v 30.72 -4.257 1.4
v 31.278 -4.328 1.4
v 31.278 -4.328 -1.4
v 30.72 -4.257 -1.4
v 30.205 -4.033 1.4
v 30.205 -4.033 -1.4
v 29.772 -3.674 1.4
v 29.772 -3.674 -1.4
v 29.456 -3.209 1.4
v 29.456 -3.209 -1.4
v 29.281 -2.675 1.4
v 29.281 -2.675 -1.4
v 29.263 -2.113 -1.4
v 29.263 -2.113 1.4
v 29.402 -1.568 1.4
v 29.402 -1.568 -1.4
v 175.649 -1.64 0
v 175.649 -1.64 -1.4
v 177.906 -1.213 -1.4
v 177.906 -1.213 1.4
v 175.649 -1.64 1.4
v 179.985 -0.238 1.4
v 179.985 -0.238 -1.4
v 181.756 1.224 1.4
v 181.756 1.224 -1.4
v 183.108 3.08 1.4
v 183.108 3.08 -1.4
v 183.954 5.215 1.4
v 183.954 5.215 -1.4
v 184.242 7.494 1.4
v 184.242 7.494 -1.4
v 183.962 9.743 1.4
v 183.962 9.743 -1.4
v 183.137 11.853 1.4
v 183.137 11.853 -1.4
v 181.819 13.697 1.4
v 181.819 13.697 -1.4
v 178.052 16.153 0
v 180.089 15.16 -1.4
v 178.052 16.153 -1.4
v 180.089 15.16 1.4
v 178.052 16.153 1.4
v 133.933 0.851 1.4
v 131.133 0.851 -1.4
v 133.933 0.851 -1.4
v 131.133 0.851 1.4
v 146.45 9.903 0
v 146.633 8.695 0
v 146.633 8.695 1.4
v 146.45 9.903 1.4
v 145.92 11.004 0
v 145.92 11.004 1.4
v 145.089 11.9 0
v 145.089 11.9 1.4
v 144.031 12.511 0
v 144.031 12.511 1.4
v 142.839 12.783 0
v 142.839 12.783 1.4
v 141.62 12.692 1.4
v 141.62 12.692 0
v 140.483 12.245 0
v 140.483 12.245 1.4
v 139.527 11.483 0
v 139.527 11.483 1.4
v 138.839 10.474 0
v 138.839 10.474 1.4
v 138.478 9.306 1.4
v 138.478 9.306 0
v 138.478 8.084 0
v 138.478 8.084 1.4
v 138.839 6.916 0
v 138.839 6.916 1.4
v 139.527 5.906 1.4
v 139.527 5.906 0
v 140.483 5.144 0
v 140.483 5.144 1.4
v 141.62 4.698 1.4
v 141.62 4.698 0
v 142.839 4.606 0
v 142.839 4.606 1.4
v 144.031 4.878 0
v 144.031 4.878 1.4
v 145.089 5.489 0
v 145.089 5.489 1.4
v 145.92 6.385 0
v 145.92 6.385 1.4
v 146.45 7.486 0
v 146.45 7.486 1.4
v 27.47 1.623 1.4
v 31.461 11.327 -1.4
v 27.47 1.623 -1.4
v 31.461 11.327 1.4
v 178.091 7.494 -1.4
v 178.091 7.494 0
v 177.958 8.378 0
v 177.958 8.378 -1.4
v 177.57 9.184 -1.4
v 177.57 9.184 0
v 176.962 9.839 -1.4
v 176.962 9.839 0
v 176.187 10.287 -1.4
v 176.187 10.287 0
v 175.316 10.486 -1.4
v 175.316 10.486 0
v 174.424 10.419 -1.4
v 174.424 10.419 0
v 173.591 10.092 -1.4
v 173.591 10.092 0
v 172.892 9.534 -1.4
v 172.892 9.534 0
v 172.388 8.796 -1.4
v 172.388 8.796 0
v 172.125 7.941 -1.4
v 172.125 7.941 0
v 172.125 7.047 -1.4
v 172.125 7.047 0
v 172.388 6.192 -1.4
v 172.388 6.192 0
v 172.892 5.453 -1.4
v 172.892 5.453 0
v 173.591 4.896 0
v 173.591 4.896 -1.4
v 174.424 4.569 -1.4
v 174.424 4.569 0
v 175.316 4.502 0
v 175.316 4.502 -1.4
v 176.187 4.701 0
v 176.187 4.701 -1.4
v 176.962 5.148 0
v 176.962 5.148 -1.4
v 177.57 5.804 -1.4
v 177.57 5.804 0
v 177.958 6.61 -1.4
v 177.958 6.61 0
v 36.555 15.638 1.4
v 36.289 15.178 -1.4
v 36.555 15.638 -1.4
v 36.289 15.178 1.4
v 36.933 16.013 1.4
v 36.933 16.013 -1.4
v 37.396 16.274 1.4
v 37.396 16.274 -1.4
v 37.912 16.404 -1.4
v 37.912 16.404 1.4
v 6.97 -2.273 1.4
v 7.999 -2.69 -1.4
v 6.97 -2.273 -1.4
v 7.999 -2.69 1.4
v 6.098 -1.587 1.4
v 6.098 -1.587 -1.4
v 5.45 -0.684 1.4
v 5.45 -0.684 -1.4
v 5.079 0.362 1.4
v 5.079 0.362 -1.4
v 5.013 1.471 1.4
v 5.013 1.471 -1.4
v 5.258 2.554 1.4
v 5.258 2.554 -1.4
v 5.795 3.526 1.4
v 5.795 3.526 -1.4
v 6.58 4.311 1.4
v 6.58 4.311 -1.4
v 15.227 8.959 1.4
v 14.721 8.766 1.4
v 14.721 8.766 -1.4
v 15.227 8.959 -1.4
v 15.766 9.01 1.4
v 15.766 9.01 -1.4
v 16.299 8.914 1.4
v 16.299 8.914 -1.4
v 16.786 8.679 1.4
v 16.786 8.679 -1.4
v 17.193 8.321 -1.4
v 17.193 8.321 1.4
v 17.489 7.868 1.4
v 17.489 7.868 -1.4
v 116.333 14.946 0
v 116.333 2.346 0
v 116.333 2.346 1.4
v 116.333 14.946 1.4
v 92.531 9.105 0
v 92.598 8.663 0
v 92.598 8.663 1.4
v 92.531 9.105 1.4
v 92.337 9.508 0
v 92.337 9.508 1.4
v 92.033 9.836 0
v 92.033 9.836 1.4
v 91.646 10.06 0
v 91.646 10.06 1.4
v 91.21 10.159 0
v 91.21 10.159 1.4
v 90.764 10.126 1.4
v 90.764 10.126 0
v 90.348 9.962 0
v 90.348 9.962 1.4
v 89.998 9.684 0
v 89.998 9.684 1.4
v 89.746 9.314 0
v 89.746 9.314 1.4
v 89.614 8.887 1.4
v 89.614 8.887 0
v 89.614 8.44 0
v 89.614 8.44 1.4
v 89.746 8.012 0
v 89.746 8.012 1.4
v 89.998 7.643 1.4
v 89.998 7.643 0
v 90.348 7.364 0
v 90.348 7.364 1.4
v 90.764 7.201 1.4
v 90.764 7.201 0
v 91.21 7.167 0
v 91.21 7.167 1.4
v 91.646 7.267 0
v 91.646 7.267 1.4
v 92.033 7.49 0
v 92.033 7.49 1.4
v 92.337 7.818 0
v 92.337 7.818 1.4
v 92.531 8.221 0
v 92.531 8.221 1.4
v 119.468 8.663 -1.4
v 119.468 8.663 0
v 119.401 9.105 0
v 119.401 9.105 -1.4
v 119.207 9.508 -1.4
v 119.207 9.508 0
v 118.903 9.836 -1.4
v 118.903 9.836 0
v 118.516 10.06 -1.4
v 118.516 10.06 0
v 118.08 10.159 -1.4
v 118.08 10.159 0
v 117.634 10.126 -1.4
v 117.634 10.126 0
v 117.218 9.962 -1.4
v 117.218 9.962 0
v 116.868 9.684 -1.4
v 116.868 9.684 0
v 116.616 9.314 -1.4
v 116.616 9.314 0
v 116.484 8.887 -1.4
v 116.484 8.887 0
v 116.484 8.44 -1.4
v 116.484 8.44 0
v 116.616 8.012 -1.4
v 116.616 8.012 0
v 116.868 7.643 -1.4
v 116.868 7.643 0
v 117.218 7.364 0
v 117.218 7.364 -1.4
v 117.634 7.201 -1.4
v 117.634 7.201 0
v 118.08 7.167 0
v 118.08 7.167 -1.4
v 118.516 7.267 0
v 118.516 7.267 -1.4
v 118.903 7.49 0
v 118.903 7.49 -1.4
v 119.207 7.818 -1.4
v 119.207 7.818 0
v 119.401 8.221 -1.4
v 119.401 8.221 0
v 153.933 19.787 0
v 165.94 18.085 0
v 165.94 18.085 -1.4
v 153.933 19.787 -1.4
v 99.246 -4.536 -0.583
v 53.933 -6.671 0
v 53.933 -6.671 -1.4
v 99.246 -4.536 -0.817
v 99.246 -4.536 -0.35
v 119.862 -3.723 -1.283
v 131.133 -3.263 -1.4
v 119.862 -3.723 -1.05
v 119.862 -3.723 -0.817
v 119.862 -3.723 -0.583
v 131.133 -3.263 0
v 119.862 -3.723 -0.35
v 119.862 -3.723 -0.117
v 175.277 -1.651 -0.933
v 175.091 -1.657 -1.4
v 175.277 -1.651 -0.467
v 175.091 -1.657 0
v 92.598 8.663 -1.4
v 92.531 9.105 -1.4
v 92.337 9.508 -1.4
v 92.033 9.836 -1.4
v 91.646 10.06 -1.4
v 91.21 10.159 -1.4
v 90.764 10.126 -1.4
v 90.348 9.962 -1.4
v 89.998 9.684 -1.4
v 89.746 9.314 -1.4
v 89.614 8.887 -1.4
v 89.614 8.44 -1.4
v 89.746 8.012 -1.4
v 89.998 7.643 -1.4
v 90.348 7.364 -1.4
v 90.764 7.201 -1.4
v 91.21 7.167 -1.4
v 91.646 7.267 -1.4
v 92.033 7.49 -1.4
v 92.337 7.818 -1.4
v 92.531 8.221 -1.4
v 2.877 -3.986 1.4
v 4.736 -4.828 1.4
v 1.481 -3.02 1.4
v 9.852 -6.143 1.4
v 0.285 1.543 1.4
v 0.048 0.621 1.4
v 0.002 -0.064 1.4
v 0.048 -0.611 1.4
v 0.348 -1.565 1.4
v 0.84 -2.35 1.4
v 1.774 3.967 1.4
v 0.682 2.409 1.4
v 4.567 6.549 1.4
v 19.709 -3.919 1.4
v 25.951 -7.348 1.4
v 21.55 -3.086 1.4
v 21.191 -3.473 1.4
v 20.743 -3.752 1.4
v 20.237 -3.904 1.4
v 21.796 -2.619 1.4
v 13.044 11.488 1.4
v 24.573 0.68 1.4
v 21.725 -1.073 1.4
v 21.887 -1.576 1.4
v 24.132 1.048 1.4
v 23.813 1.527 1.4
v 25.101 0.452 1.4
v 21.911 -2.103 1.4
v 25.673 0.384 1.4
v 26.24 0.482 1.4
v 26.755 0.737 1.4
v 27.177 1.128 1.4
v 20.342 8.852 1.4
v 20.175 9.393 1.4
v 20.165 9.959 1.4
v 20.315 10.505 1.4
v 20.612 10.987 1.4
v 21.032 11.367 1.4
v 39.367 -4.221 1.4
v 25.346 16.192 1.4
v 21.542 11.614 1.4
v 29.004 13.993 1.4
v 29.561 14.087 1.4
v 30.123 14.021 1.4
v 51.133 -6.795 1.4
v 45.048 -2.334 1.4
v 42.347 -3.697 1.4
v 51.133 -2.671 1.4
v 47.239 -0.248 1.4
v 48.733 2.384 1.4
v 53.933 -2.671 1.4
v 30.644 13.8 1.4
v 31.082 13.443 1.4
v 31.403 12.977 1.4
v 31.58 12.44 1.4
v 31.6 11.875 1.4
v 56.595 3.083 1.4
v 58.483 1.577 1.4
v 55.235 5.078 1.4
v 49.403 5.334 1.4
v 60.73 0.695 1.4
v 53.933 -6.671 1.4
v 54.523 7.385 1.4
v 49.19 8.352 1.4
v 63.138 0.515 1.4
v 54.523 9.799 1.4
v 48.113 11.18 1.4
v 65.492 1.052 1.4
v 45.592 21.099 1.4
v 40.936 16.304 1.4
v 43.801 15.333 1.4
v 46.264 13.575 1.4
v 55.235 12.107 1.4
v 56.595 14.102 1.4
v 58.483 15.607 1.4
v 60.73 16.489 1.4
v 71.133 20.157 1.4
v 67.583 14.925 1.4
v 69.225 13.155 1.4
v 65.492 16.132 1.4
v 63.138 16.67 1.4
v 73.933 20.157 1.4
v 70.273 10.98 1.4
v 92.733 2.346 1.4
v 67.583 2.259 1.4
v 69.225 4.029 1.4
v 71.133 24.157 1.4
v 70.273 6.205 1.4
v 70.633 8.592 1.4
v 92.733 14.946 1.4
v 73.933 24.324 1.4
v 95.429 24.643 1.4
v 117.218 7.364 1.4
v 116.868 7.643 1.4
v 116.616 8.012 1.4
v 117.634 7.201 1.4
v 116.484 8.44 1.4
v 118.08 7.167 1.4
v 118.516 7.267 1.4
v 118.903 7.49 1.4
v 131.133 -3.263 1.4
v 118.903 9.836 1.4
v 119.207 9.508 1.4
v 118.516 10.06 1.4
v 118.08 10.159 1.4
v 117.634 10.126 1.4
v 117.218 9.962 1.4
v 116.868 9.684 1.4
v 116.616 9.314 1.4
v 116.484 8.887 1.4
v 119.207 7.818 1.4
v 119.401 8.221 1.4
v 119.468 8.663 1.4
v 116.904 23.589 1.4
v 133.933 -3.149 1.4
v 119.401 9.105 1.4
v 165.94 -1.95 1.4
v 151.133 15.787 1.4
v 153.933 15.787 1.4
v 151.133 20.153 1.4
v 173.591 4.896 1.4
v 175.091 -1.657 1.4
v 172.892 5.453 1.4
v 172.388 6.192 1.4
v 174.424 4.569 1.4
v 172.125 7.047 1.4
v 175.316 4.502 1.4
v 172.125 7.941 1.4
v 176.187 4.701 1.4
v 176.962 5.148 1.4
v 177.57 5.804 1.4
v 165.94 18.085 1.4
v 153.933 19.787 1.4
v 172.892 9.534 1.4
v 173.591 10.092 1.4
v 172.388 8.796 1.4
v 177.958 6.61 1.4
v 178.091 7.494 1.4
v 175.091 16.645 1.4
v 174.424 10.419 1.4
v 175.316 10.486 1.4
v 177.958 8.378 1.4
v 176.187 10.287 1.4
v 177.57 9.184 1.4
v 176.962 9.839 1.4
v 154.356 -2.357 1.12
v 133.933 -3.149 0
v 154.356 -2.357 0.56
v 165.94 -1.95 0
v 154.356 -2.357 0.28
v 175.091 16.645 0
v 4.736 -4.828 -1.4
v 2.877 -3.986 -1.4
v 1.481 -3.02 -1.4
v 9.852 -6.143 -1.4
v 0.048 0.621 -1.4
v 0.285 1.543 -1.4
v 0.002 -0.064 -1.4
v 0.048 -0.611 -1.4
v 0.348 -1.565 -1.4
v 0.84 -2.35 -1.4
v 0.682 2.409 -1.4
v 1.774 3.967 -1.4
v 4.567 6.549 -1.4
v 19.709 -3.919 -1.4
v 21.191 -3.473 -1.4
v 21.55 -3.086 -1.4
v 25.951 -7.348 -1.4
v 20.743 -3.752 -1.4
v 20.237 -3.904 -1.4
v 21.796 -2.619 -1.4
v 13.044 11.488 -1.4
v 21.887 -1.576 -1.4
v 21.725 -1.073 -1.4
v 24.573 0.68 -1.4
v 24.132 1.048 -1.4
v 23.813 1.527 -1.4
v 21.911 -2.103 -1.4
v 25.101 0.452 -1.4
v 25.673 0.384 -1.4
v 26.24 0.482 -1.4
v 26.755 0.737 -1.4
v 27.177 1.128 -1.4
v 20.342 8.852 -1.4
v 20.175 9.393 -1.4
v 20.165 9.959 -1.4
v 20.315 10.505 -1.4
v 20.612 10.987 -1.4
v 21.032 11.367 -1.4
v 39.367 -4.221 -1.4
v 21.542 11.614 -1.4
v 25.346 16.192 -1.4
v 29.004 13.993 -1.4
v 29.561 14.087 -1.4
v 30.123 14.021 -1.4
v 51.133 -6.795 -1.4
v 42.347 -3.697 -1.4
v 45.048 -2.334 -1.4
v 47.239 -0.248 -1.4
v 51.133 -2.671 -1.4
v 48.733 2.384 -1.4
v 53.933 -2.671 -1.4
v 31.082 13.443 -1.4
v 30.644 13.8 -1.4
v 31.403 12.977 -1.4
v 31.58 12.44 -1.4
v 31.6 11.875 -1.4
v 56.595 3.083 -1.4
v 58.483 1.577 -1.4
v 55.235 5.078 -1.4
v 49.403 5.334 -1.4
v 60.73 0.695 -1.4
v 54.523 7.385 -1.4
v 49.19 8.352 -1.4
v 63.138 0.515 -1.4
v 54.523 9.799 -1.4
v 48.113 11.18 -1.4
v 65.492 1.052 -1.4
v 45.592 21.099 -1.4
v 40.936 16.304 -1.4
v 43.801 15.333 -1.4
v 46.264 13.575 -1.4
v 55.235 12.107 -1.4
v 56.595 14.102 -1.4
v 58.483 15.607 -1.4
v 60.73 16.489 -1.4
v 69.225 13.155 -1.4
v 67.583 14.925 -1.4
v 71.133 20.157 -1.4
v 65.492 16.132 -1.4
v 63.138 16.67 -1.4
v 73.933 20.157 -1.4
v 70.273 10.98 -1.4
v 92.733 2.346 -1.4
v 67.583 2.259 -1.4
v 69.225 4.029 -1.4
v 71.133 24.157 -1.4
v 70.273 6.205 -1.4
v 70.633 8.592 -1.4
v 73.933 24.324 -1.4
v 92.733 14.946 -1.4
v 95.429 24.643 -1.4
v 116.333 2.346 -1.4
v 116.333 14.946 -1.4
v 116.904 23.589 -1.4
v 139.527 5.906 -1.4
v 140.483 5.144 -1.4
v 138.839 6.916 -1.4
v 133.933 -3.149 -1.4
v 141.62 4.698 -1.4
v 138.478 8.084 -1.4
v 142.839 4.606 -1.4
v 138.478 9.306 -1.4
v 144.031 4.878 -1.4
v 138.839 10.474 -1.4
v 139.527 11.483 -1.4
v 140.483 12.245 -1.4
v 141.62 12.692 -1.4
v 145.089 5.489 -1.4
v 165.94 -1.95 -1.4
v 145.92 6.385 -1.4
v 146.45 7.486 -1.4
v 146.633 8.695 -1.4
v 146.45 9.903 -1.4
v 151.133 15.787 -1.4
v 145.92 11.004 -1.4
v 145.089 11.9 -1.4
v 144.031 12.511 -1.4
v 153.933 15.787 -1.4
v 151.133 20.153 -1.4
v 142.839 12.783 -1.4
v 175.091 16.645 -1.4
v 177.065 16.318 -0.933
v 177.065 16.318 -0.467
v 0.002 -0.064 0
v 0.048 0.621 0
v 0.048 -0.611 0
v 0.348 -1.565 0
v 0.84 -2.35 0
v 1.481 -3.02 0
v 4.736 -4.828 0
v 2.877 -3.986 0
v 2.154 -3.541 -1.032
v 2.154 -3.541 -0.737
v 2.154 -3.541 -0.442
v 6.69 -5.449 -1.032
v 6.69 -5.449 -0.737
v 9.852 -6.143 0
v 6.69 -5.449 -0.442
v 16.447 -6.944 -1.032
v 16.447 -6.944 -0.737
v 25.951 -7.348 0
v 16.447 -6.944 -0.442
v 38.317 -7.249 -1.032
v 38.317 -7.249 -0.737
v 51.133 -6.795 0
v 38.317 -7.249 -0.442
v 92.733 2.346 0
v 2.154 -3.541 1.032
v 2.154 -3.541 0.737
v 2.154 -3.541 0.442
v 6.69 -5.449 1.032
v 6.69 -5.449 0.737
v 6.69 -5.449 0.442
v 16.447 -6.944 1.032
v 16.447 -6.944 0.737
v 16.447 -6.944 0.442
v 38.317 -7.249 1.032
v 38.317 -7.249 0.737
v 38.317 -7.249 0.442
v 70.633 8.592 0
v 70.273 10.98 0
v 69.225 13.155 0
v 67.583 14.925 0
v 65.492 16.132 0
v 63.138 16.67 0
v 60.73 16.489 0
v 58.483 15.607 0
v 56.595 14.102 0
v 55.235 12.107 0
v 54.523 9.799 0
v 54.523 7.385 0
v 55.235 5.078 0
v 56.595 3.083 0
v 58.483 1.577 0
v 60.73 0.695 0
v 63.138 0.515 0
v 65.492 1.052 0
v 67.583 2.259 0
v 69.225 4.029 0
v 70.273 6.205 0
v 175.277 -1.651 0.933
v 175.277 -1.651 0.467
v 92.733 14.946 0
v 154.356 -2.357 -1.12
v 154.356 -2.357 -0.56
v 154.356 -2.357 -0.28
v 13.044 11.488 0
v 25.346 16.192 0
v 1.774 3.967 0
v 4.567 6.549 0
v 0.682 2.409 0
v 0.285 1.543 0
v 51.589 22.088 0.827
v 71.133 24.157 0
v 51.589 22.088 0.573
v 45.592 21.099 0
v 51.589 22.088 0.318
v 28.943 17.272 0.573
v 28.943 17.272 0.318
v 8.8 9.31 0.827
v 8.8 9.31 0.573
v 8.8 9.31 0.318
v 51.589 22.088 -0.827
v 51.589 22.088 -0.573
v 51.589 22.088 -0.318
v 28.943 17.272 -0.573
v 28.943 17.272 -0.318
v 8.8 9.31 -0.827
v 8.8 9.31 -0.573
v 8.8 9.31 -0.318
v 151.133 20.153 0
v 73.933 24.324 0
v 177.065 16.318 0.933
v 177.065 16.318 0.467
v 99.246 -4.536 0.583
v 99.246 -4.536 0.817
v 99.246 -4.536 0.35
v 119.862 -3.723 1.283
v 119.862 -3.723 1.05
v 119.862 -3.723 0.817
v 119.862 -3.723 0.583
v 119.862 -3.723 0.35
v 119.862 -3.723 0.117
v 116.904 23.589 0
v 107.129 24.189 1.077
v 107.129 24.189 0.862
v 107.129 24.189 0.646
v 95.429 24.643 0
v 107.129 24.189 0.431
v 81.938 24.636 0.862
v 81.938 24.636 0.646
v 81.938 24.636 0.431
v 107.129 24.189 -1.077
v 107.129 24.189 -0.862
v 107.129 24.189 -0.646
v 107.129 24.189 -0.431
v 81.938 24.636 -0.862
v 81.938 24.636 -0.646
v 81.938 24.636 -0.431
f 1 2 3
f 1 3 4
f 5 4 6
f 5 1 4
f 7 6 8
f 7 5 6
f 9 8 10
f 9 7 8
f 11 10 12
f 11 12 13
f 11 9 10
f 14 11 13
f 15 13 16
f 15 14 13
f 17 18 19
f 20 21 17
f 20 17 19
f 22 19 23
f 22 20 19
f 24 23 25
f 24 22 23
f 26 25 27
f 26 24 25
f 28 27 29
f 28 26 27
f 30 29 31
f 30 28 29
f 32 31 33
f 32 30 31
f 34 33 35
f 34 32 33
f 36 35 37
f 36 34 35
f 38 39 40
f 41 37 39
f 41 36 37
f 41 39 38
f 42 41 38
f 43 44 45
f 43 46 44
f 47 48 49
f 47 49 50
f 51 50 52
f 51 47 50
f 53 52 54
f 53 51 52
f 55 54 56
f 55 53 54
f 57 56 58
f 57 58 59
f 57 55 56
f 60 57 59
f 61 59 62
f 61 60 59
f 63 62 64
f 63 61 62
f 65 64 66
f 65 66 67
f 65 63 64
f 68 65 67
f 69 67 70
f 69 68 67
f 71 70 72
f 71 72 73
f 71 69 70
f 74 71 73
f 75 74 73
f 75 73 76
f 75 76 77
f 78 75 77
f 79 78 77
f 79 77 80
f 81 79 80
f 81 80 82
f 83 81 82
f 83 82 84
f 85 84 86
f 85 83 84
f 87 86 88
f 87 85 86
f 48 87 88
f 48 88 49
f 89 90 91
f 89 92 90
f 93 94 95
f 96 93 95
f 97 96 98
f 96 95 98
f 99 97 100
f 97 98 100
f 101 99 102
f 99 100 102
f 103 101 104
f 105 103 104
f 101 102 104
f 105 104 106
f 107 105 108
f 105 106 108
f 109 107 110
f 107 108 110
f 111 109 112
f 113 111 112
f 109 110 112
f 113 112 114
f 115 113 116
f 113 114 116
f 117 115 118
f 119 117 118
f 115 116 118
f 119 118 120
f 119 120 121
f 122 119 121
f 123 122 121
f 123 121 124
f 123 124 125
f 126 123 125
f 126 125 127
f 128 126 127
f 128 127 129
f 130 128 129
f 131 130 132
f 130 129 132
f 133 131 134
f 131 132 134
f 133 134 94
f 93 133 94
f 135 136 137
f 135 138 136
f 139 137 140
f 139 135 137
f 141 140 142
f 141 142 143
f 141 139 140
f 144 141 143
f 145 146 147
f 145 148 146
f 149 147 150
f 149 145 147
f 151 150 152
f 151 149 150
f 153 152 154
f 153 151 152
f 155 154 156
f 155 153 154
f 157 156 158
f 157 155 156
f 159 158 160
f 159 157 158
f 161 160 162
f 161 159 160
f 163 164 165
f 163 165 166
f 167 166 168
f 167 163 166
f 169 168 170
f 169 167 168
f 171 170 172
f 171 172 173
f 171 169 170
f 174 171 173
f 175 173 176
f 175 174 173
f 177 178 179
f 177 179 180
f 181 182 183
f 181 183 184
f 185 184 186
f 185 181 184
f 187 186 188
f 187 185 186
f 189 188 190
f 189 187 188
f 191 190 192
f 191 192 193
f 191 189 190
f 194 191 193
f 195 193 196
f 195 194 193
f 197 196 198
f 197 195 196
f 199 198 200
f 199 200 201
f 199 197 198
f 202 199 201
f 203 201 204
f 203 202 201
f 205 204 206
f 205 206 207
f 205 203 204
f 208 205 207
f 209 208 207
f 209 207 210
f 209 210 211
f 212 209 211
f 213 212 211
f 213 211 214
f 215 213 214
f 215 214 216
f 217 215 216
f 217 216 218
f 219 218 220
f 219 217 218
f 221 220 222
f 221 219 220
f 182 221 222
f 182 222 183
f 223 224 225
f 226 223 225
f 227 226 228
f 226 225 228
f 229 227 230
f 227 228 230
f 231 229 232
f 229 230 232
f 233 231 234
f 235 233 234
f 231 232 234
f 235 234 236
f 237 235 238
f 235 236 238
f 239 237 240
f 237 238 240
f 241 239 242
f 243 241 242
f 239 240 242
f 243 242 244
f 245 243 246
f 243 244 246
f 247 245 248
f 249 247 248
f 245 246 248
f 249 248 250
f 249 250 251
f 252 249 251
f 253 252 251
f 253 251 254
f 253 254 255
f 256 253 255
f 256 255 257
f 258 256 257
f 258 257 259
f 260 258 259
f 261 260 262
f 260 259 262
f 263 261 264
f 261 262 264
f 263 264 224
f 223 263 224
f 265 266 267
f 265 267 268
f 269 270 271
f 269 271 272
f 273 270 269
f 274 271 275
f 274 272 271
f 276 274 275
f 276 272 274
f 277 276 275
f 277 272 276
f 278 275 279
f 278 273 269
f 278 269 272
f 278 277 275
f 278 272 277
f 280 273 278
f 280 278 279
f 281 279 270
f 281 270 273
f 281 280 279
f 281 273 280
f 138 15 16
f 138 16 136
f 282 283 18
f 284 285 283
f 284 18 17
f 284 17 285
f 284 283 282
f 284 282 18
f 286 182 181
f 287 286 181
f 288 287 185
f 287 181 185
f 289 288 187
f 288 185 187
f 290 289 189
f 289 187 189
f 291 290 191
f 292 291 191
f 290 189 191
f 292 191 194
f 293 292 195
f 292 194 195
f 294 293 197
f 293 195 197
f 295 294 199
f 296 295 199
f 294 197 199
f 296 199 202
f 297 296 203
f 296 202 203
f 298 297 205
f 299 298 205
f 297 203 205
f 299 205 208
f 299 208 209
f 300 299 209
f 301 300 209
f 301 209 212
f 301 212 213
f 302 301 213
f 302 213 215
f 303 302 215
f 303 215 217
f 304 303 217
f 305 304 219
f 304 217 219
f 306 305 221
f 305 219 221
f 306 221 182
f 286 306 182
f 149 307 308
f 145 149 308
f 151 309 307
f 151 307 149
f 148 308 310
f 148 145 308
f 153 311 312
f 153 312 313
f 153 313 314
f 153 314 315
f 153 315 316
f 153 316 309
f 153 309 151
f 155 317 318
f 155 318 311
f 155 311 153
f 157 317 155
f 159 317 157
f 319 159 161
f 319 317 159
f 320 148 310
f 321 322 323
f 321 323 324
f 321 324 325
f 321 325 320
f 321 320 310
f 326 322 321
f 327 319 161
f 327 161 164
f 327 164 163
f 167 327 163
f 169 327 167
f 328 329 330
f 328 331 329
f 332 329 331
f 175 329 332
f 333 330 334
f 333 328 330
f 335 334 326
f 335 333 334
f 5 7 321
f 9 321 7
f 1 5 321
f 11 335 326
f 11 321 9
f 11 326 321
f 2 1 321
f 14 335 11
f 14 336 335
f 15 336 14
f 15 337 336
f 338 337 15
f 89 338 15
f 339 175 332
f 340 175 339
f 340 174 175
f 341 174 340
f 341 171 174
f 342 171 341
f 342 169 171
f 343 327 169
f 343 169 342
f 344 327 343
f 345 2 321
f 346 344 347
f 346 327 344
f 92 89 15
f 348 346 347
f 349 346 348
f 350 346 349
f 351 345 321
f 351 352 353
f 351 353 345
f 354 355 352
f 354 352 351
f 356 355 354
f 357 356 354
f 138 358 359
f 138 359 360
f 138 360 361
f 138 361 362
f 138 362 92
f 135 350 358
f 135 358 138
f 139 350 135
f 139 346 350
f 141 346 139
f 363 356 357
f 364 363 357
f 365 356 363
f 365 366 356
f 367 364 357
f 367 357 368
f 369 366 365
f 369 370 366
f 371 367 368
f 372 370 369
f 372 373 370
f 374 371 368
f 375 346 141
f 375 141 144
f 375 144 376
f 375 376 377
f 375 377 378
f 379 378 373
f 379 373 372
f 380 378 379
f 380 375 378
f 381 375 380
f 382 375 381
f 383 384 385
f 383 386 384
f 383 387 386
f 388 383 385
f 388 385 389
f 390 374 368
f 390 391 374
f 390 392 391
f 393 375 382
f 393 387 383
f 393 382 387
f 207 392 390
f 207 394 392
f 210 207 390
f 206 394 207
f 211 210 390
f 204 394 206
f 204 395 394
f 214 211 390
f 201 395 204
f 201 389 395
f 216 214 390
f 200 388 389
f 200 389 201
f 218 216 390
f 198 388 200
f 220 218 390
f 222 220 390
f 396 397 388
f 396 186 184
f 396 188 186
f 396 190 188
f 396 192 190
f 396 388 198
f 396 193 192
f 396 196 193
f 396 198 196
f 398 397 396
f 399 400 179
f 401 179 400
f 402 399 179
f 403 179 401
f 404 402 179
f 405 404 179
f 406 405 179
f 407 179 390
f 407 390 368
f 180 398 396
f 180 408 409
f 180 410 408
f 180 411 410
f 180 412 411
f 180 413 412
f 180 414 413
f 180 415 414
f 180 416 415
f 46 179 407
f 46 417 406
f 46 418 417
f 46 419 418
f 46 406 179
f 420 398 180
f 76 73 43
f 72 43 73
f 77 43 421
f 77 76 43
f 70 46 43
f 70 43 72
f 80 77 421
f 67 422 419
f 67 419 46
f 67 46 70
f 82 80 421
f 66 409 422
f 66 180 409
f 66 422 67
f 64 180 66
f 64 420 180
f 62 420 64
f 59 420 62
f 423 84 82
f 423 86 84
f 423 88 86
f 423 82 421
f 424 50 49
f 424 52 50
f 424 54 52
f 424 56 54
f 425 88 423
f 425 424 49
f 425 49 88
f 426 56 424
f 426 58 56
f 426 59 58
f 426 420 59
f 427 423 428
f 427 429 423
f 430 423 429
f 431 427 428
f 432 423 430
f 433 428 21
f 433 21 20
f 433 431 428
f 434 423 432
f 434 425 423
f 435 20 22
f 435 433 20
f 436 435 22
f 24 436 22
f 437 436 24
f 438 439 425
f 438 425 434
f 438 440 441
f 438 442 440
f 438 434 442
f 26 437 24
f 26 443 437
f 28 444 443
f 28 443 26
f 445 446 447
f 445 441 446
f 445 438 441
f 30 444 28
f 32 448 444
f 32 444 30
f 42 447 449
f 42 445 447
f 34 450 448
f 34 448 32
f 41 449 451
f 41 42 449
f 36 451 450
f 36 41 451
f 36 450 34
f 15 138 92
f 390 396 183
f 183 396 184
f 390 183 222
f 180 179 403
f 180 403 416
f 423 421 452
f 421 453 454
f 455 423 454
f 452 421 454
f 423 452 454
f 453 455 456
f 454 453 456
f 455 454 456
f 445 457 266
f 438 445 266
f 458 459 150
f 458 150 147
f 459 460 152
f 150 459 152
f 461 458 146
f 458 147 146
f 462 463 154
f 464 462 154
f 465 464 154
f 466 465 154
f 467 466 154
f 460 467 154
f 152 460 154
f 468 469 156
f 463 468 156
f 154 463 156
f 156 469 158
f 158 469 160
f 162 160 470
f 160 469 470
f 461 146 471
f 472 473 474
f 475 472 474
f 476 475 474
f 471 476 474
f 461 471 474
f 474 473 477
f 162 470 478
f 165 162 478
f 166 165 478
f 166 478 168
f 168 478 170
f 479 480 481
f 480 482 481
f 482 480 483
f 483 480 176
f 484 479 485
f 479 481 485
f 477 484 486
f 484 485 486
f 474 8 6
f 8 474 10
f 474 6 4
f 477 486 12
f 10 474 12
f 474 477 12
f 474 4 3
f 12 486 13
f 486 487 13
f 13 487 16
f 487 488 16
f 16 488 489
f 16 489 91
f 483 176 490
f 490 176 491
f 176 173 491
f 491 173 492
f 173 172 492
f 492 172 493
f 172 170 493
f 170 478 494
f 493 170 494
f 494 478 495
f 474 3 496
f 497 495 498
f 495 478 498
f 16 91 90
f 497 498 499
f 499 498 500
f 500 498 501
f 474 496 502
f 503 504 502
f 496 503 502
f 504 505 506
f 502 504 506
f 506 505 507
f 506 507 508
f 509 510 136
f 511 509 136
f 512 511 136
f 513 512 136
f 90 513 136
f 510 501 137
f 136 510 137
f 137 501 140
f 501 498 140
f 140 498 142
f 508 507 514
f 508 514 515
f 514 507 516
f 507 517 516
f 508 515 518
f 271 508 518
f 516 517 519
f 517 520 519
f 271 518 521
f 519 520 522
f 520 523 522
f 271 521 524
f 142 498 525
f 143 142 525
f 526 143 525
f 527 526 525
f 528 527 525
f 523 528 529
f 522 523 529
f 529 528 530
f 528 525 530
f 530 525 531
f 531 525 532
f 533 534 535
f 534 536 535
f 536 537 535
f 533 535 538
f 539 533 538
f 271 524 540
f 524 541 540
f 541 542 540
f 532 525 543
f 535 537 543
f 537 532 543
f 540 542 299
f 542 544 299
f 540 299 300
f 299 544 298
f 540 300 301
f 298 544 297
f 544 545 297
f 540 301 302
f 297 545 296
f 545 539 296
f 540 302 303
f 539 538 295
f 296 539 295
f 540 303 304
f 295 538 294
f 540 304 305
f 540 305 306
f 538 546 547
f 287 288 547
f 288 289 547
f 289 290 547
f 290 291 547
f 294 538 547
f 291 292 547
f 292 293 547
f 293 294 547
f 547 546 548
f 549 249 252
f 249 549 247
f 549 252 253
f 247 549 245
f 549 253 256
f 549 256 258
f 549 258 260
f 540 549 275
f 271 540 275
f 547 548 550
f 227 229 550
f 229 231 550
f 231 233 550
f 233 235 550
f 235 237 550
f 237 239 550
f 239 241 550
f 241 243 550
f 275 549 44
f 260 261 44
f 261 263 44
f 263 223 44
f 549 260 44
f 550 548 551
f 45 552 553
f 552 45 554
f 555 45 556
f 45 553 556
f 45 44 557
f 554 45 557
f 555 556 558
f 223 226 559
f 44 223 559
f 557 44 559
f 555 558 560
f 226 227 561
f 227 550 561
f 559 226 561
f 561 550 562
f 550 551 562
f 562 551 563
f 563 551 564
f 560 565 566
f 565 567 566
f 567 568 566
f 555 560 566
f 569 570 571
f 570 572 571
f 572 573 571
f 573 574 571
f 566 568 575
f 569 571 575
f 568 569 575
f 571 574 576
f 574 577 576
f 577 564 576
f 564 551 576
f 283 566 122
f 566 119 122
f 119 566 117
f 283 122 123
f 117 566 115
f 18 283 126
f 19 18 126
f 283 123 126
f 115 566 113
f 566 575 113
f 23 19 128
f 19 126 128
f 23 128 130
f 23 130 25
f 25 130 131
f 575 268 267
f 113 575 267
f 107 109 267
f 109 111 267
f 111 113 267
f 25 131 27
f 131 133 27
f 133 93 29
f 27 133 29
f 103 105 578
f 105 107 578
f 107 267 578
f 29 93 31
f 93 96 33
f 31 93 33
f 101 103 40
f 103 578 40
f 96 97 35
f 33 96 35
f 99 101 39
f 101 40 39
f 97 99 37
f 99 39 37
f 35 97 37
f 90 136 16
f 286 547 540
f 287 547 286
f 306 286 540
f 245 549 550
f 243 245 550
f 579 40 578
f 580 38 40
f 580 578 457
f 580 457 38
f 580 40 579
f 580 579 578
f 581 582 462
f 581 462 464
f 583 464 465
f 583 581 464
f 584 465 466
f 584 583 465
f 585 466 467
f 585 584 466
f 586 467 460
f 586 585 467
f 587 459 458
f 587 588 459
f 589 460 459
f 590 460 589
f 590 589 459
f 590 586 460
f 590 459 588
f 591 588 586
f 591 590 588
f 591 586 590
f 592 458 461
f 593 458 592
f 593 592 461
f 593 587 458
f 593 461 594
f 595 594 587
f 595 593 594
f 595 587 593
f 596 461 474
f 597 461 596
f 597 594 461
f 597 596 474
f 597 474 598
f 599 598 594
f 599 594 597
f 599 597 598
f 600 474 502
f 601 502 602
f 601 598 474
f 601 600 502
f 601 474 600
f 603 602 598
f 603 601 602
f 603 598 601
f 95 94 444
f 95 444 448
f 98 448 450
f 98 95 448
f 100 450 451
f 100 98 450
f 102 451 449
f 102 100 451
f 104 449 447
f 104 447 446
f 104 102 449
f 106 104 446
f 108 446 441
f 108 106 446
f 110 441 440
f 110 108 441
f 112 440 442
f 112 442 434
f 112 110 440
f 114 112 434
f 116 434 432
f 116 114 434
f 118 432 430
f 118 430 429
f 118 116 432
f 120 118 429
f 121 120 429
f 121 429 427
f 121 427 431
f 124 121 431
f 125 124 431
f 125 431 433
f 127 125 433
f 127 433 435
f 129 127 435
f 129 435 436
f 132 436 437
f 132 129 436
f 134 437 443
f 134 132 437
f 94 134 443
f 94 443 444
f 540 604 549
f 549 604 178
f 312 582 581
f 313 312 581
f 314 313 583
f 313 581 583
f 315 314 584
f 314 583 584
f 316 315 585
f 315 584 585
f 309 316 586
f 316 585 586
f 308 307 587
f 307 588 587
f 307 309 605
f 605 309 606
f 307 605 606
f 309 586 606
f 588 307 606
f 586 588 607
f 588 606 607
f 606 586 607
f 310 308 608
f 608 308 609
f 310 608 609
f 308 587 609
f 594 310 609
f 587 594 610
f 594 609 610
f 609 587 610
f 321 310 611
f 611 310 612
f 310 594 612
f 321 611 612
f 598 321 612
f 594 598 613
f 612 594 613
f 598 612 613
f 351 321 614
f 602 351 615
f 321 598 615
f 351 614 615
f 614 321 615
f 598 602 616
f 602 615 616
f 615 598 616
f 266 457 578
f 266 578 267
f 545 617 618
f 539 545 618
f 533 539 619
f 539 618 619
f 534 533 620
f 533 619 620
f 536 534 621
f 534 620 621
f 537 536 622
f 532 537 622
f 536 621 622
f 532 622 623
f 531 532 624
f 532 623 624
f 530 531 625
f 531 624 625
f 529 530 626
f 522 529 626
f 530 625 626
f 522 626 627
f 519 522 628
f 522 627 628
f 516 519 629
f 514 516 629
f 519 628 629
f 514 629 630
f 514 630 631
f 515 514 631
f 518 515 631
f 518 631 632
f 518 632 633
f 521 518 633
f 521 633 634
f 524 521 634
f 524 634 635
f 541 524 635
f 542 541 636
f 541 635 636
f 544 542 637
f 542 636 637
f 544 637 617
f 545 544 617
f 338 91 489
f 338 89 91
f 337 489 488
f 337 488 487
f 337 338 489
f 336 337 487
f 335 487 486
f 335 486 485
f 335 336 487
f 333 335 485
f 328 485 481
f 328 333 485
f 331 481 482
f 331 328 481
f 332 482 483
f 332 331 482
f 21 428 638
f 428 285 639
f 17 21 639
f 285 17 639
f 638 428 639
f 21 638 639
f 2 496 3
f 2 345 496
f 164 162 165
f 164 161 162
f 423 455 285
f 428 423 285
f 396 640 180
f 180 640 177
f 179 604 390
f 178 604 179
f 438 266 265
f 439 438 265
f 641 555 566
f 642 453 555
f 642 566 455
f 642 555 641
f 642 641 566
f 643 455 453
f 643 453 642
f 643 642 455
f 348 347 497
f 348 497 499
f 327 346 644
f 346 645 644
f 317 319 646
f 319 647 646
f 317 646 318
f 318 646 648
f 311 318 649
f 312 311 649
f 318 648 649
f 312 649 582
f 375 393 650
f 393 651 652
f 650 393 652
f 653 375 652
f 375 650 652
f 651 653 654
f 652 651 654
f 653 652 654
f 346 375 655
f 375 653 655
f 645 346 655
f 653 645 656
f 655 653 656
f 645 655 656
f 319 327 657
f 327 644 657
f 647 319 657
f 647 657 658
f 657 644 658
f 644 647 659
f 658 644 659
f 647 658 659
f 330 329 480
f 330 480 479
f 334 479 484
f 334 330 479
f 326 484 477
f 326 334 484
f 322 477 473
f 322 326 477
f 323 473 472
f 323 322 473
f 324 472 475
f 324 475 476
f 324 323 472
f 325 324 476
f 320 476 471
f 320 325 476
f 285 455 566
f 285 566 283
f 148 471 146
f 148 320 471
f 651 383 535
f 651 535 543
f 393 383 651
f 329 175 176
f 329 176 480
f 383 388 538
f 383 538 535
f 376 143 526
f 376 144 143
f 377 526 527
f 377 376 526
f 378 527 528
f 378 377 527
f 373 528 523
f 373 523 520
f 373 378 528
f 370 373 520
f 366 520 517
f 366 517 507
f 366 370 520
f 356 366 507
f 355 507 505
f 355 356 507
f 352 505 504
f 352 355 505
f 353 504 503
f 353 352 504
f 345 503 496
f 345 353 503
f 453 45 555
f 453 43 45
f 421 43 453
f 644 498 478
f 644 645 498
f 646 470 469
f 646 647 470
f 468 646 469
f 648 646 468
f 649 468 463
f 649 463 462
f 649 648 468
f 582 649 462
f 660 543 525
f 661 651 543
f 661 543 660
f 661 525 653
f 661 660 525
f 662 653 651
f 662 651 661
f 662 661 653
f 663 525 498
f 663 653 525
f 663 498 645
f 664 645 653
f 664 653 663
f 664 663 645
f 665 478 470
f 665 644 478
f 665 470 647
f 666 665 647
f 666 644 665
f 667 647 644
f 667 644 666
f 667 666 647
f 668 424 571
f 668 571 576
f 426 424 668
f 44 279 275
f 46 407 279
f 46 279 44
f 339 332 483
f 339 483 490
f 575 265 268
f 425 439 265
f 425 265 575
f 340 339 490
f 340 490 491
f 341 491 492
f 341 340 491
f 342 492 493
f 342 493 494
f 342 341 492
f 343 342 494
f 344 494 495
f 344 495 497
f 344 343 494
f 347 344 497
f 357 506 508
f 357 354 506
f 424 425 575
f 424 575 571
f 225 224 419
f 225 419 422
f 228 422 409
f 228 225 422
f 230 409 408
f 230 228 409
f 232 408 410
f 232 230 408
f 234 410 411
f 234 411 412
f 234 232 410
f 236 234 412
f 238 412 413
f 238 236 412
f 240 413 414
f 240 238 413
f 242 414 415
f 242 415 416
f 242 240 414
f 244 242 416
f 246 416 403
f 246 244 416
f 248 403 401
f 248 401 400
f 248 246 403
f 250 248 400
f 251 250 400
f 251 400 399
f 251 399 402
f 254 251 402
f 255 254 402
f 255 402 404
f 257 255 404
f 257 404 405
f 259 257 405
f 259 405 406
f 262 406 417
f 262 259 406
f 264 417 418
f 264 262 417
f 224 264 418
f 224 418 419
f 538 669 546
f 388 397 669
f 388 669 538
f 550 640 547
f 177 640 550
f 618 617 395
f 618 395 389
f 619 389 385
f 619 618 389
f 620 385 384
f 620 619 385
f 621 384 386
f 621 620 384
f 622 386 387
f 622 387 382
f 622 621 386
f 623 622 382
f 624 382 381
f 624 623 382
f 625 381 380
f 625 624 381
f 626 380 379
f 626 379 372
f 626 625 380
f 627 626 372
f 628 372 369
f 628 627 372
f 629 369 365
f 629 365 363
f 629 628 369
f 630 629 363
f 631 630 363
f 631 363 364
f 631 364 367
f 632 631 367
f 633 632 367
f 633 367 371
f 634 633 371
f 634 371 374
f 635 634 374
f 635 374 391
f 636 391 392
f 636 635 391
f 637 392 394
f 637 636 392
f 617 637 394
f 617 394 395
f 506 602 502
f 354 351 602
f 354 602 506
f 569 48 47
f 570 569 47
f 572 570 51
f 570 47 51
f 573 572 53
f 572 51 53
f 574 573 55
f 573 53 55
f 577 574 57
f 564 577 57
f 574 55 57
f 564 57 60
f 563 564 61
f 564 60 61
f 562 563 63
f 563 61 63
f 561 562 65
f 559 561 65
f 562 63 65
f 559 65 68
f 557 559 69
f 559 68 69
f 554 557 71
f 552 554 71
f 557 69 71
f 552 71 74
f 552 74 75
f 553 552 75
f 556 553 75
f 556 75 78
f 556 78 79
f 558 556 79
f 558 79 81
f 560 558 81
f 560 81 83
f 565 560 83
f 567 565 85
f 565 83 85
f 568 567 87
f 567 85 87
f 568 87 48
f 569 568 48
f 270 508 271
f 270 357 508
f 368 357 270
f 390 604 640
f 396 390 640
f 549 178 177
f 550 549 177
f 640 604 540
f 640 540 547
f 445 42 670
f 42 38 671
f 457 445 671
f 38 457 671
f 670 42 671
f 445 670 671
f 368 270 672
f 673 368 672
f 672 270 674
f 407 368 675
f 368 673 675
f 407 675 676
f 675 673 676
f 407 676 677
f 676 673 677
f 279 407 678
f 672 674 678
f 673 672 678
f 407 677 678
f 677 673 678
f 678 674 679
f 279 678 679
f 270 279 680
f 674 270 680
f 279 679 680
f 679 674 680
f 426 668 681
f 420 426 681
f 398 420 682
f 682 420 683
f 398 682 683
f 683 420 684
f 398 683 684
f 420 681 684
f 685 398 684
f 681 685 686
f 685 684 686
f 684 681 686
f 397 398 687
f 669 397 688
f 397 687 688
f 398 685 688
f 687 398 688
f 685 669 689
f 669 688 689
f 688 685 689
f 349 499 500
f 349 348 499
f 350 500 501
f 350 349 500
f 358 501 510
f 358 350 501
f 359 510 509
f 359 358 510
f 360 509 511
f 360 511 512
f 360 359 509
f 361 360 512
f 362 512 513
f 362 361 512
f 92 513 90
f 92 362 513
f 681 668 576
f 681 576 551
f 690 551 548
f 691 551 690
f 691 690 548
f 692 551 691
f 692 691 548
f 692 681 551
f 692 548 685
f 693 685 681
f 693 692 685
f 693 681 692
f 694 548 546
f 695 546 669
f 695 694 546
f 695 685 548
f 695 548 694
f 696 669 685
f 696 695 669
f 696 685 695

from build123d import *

# Parameters (mm, degrees)
SKETCH_2_R      = 8.1
SKETCH_2_R_2    = 1.5
SKETCH_2_W      = 23.6
SKETCH_2_H      = 12.6
SKETCH_2_R_3    = 4.1
SKETCH_2_R_4    = 3
EXTRUDE_2_DEPTH = 1.4


with BuildPart() as part:
    # Эскиз2 → Бобышка-Вытянуть2 (new, symmetric)
    # profile 1 of 4: a face of its own
    with BuildSketch(Plane.XY):
        with BuildLine():
            Line((165.940456932, 7.493910465), (165.940456932, 18.08535451))
            add(Edge.make_bspline(
                [(165.940456927, 18.085354477), (165.930512982, 18.086853188), (163.740114219, 18.416932942), (159.739714866, 19.000386852), (155.744292591, 19.547112651), (153.932619318, 19.787470759)],
                knots=[0.332761263, 0.332761263, 0.332761263, 0.332761263, 0.332878042, 0.358484538, 0.379707003, 0.379707003, 0.379707003, 0.379707003], degree=3))
            Line((153.932619318, 19.787470759), (153.932619318, 15.787470759))
            Line((153.932619318, 15.787470759), (151.132619318, 15.787470759))
            Line((151.132619318, 15.787470759), (151.132619318, 20.152925753))
            add(Edge.make_bspline(
                [(151.132619318, 20.152925753), (149.51271539, 20.360855756), (145.712882211, 20.834305053), (139.731359791, 21.525676112), (133.19183673, 22.212004248), (126.658683026, 22.825721427), (120.136770918, 23.363973264), (113.62856714, 23.824677322), (107.152732037, 24.200242592), (100.741095693, 24.498399508), (94.411752715, 24.686649766), (88.155917993, 24.740095648), (81.949043055, 24.658849141), (77.212383792, 24.491578654), (74.545027167, 24.35694527), (73.932619318, 24.323871534)],
                knots=[0.390637302, 0.390637302, 0.390637302, 0.390637302, 0.409602822, 0.435103874, 0.460559416, 0.485959195, 0.51130307, 0.536551515, 0.561723366, 0.586628867, 0.611085431, 0.6352512, 0.659272176, 0.683163753, 0.690285585, 0.690285585, 0.690285585, 0.690285585], degree=3))
            Line((73.932619318, 24.323871534), (73.932619318, 20.157469486))
            Line((73.932619318, 20.157469486), (71.132619318, 20.157469486))
            Line((71.132619318, 20.157469486), (71.132619318, 24.157469486))
            add(Edge.make_bspline(
                [(71.132619318, 24.157469486), (70.635982629, 24.125241372), (68.110579653, 23.953963558), (63.575410502, 23.578006358), (57.555189551, 22.924946655), (51.605762689, 22.119065518), (45.744400312, 21.156564429), (39.995857594, 20.035371386), (34.397919843, 18.75631623), (29.010382104, 17.327615604), (23.925798409, 15.771864917), (19.27067884, 14.13426943), (15.179098392, 12.483335433), (11.740475791, 10.89561099), (8.959371869, 9.429577361), (6.760891181, 8.108603195), (5.033709749, 6.92463805), (3.671694934, 5.85422966), (2.592101124, 4.871305364), (1.738175669, 3.952595739), (1.069870831, 3.080946369), (0.571645411, 2.241622098), (0.2157739, 1.430785392), (0.102255582, 0.88324169), (0.047975001, 0.621424995)],
                knots=[0.701142916, 0.701142916, 0.701142916, 0.701142916, 0.706922144, 0.73053591, 0.7539832, 0.77723469, 0.800246382, 0.822950709, 0.845237155, 0.866915896, 0.887662335, 0.906968281, 0.924203157, 0.938878975, 0.950931611, 0.960693484, 0.968646729, 0.975232933, 0.980794744, 0.985583761, 0.989781539, 0.993521313, 0.996902113, 1, 1, 1, 1], degree=3))
            add(Edge.make_bspline(
                [(0.047975001, 0.621424995), (0.022713821, 0.373490081), (-0.027820788, -0.12249998), (0.077991213, -0.884434595), (0.349695651, -1.638838075), (0.814331136, -2.365068928), (1.463480781, -3.039275249), (2.290973018, -3.660999474), (3.305928751, -4.235779626), (4.53525562, -4.773674148), (6.029745689, -5.282192169), (7.868981216, -5.765316681), (10.168831393, -6.221716597), (13.07543819, -6.639618735), (16.728115364, -6.992956742), (21.189952097, -7.247345149), (26.399984417, -7.376638853), (32.197398565, -7.376256917), (38.39780676, -7.261436583), (44.752137938, -7.05998551), (49.023344092, -6.886827907), (51.132619318, -6.795360627)],
                knots=[0, 0, 0, 0, 0.002941446, 0.005884319, 0.00901613, 0.012364547, 0.016007934, 0.020036845, 0.024573728, 0.029783835, 0.03589701, 0.04324044, 0.052275965, 0.063634589, 0.077983176, 0.095698161, 0.116520086, 0.13966073, 0.16431217, 0.18991889, 0.214908072, 0.214908072, 0.214908072, 0.214908072], degree=3))
            Line((51.132619318, -6.795360627), (51.132619318, -2.670677263))
            Line((51.132619318, -2.670677263), (53.932619318, -2.670677263))
            Line((53.932619318, -2.670677263), (53.932619318, -6.670677263))
            add(Edge.make_bspline(
                [(53.932619318, -6.670677263), (55.356569482, -6.605720394), (59.058679651, -6.431131786), (65.052094606, -6.13285227), (71.91077271, -5.784005184), (78.771375577, -5.439680462), (85.61049861, -5.110951262), (92.43210759, -4.804953337), (99.255031191, -4.531981668), (106.097378406, -4.278274685), (112.969211681, -4.003089942), (119.864404255, -3.723176202), (125.92308308, -3.47492717), (129.679854903, -3.321735217), (131.132619318, -3.262735091)],
                knots=[0.225966113, 0.225966113, 0.225966113, 0.225966113, 0.242837762, 0.269833583, 0.296993022, 0.324123272, 0.351139107, 0.378035509, 0.404946016, 0.431960837, 0.459078395, 0.4863474, 0.51364083, 0.530850189, 0.530850189, 0.530850189, 0.530850189], degree=3))
            Line((131.132619318, -3.262735091), (131.132619318, 0.850647814))
            Line((131.132619318, 0.850647814), (133.932619318, 0.850647814))
            Line((133.932619318, 0.850647814), (133.932619318, -3.149352186))
            add(Edge.make_bspline(
                [(133.932619318, -3.149352186), (136.150252366, -3.05984138), (140.66441482, -2.879164577), (147.472013762, -2.613922958), (154.352602411, -2.355626415), (160.507662095, -2.135075484), (164.369425992, -2.00299999), (165.940456932, -1.950382964)],
                knots=[0.541906346, 0.541906346, 0.541906346, 0.541906346, 0.568176028, 0.595379569, 0.622543445, 0.64967326, 0.668278692, 0.668278692, 0.668278692, 0.668278692], degree=3))
            Line((165.940456932, -1.950382964), (165.940456932, 7.493910465))
        make_face()
        with BuildLine():
            ThreePointArc((14.721240391, 8.766081587), (16.29867531, 8.913940332), (17.488708089, 7.868002897))
            Line((17.488708089, 7.868002897), (21.725441093, -1.073266618))
            ThreePointArc((21.725441093, -1.073266618), (21.549996986, -3.085882804), (19.709418924, -3.918755509))
            Line((19.709418924, -3.918755509), (7.999391348, -2.690370853))
            ThreePointArc((7.999391348, -2.690370853), (5.078852056, 0.362162442), (6.580135706, 4.311042875))
            Line((6.580135706, 4.311042875), (14.721240391, 8.766081587))
        make_face(mode=Mode.SUBTRACT)
        with BuildLine():
            Line((23.813024955, 1.527110532), (20.342244628, 8.85190119))
            ThreePointArc((20.342244628, 8.85190119), (20.315234657, 10.50521233), (21.542097769, 11.613803404))
            Line((21.542097769, 11.613803404), (29.003823035, 13.992759157))
            ThreePointArc((29.003823035, 13.992759157), (31.082028751, 13.44264333), (31.461008962, 11.326528867))
            Line((31.461008962, 11.326528867), (27.470064023, 1.622782457))
            ThreePointArc((27.470064023, 1.622782457), (25.672695714, 0.384197539), (23.813024955, 1.527110532))
        make_face(mode=Mode.SUBTRACT)
        with BuildLine():
            ThreePointArc((31.277857225, -4.328453595), (29.59717908, -3.452864074), (29.401621993, -1.567898965))
            Line((29.401621993, -1.567898965), (36.28872379, 15.177681436))
            ThreePointArc((36.28872379, 15.177681436), (36.93262885, 16.01260855), (37.911651949, 16.404055587))
            ThreePointArc((37.911651949, 16.404055587), (49.40696202, 6.85120019), (39.366777065, -4.221012142))
            Line((39.366777065, -4.221012142), (31.277857225, -4.328453595))
        make_face(mode=Mode.SUBTRACT)
        with Locations((62.532619318, 8.592254753)):
            Circle(SKETCH_2_R, mode=Mode.SUBTRACT)
        with Locations((91.097584877, 8.663246996)):
            Circle(SKETCH_2_R_2, mode=Mode.SUBTRACT)
        with Locations((104.532584877, 8.646041596)):
            Rectangle(SKETCH_2_W, SKETCH_2_H, mode=Mode.SUBTRACT)
        with Locations((117.967584877, 8.663246996)):
            Circle(SKETCH_2_R_2, mode=Mode.SUBTRACT)
        with Locations((142.532619318, 8.694705966)):
            Circle(SKETCH_2_R_3, mode=Mode.SUBTRACT)
    # profile 2 of 4: a face of its own
    with BuildSketch(Plane.XY):
        with BuildLine():
            ThreePointArc((175.09133409, 16.644787515), (168.620686836, 13.964557687), (165.940456932, 7.493910465))
            ThreePointArc((165.940456932, 7.493910465), (168.62068676, 1.023263102), (175.091334091, -1.656966802))
            add(Edge.make_bspline(
                [(175.091334091, -1.656966802), (175.277208172, -1.651281031), (175.463082779, -1.645612457), (175.648957912, -1.639961136)],
                knots=[0.704401069, 0.704401069, 0.704401069, 0.704401069, 0.706602137, 0.706602137, 0.706602137, 0.706602137], degree=3))
            ThreePointArc((175.648957912, -1.639961136), (181.75621593, 1.223511419), (184.242211249, 7.493910357))
            ThreePointArc((184.242211249, 7.493910357), (182.535436414, 12.815930026), (178.051789748, 16.152677882))
            add(Edge.make_bspline(
                [(178.051789748, 16.152677882), (177.065313176, 16.318762985), (176.078492678, 16.482805505), (175.091334086, 16.644787486)],
                knots=[0.285286421, 0.285286421, 0.285286421, 0.285286421, 0.296903142, 0.296903142, 0.296903142, 0.296903142], degree=3))
        make_face()
        with Locations((175.091334091, 7.493910357)):
            Circle(SKETCH_2_R_4, mode=Mode.SUBTRACT)
    # profile 3 of 4: a face of its own
    with BuildSketch(Plane.XY):
        with BuildLine():
            add(Edge.make_bspline(
                [(175.091334086, 16.644787486), (174.212389383, 16.789012746), (171.164330743, 17.283350355), (168.11310015, 17.757902557), (165.940456927, 18.085354477)],
                knots=[0.296903142, 0.296903142, 0.296903142, 0.296903142, 0.30724642, 0.332761263, 0.332761263, 0.332761263, 0.332761263], degree=3))
            Line((165.940456932, 18.08535451), (165.940456932, 7.493910465))
            ThreePointArc((165.940456932, 7.493910465), (168.620686836, 13.964557687), (175.09133409, 16.644787515))
        make_face()
    # profile 4 of 4: a face of its own
    with BuildSketch(Plane.XY):
        with BuildLine():
            ThreePointArc((175.091334091, -1.656966802), (168.62068676, 1.023263102), (165.940456932, 7.493910465))
            Line((165.940456932, 7.493910465), (165.940456932, -1.950382964))
            add(Edge.make_bspline(
                [(165.940456932, -1.950382964), (166.657896825, -1.926354441), (169.661989692, -1.826713582), (172.712313278, -1.729793129), (175.045239361, -1.65837681), (175.091334091, -1.656966802)],
                knots=[0.668278692, 0.668278692, 0.668278692, 0.668278692, 0.676775201, 0.703855228, 0.704401069, 0.704401069, 0.704401069, 0.704401069], degree=3))
        make_face()
    extrude(amount=EXTRUDE_2_DEPTH, both=True)


solid = part.part
